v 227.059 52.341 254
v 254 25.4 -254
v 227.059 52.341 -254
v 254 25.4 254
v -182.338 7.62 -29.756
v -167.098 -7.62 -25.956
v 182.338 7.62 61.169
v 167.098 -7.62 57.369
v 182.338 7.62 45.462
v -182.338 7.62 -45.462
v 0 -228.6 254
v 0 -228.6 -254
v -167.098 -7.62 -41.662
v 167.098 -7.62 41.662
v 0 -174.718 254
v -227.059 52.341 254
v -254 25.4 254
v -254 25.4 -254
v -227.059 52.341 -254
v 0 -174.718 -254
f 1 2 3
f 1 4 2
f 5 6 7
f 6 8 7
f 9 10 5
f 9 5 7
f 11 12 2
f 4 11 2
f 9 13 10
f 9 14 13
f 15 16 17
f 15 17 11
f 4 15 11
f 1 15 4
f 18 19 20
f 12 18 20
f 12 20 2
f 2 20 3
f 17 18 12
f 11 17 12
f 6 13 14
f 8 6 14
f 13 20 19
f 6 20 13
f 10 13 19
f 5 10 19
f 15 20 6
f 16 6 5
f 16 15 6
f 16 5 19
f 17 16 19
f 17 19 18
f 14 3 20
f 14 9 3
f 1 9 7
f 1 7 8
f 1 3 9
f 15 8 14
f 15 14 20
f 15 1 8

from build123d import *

# Parameters (mm, degrees)
F2_W     = 431.8
F2_H     = 15.24
F3_DEPTH = 15.24
F5_DEPTH = 51.827874
F6_DEPTH = 67.423307
F7_DEPTH = 254


with BuildPart() as f3:
    # F2 (on face) → F3 (new body)
    with BuildSketch(Plane(origin=(0, 0, 0), x_dir=(0.970296, 0, 0.241922), z_dir=(0.241922, 0, -0.970296))):
        with Locations((1.670222, 0)):
            Rectangle(F2_W, F2_H)
    extrude(amount=-F3_DEPTH)

    # F4 (on Top) → F5 (cut, through all)
    with BuildSketch(Plane.XY):
        Polygon((0, -174.718463), (-227.059232, 52.340768), (-254, 25.4), (0, -228.6), (254, 25.4), (227.059232, 52.340768), align=None)
    extrude(amount=-F5_DEPTH, mode=Mode.SUBTRACT)

    # F4 (on Top) → F6 (cut, through all)
    with BuildSketch(Plane.XY):
        Polygon((0, -174.718463), (-227.059232, 52.340768), (-254, 25.4), (0, -228.6), (254, 25.4), (227.059232, 52.340768), align=None)
    extrude(amount=F6_DEPTH, mode=Mode.SUBTRACT)

    # F4 (on Top) → F7 (join, symmetric)
    with BuildSketch(Plane.XY):
        Polygon((0, -174.718463), (-227.059232, 52.340768), (-254, 25.4), (0, -228.6), (254, 25.4), (227.059232, 52.340768), align=None)
    extrude(amount=F7_DEPTH, both=True)


solid = f3.part
